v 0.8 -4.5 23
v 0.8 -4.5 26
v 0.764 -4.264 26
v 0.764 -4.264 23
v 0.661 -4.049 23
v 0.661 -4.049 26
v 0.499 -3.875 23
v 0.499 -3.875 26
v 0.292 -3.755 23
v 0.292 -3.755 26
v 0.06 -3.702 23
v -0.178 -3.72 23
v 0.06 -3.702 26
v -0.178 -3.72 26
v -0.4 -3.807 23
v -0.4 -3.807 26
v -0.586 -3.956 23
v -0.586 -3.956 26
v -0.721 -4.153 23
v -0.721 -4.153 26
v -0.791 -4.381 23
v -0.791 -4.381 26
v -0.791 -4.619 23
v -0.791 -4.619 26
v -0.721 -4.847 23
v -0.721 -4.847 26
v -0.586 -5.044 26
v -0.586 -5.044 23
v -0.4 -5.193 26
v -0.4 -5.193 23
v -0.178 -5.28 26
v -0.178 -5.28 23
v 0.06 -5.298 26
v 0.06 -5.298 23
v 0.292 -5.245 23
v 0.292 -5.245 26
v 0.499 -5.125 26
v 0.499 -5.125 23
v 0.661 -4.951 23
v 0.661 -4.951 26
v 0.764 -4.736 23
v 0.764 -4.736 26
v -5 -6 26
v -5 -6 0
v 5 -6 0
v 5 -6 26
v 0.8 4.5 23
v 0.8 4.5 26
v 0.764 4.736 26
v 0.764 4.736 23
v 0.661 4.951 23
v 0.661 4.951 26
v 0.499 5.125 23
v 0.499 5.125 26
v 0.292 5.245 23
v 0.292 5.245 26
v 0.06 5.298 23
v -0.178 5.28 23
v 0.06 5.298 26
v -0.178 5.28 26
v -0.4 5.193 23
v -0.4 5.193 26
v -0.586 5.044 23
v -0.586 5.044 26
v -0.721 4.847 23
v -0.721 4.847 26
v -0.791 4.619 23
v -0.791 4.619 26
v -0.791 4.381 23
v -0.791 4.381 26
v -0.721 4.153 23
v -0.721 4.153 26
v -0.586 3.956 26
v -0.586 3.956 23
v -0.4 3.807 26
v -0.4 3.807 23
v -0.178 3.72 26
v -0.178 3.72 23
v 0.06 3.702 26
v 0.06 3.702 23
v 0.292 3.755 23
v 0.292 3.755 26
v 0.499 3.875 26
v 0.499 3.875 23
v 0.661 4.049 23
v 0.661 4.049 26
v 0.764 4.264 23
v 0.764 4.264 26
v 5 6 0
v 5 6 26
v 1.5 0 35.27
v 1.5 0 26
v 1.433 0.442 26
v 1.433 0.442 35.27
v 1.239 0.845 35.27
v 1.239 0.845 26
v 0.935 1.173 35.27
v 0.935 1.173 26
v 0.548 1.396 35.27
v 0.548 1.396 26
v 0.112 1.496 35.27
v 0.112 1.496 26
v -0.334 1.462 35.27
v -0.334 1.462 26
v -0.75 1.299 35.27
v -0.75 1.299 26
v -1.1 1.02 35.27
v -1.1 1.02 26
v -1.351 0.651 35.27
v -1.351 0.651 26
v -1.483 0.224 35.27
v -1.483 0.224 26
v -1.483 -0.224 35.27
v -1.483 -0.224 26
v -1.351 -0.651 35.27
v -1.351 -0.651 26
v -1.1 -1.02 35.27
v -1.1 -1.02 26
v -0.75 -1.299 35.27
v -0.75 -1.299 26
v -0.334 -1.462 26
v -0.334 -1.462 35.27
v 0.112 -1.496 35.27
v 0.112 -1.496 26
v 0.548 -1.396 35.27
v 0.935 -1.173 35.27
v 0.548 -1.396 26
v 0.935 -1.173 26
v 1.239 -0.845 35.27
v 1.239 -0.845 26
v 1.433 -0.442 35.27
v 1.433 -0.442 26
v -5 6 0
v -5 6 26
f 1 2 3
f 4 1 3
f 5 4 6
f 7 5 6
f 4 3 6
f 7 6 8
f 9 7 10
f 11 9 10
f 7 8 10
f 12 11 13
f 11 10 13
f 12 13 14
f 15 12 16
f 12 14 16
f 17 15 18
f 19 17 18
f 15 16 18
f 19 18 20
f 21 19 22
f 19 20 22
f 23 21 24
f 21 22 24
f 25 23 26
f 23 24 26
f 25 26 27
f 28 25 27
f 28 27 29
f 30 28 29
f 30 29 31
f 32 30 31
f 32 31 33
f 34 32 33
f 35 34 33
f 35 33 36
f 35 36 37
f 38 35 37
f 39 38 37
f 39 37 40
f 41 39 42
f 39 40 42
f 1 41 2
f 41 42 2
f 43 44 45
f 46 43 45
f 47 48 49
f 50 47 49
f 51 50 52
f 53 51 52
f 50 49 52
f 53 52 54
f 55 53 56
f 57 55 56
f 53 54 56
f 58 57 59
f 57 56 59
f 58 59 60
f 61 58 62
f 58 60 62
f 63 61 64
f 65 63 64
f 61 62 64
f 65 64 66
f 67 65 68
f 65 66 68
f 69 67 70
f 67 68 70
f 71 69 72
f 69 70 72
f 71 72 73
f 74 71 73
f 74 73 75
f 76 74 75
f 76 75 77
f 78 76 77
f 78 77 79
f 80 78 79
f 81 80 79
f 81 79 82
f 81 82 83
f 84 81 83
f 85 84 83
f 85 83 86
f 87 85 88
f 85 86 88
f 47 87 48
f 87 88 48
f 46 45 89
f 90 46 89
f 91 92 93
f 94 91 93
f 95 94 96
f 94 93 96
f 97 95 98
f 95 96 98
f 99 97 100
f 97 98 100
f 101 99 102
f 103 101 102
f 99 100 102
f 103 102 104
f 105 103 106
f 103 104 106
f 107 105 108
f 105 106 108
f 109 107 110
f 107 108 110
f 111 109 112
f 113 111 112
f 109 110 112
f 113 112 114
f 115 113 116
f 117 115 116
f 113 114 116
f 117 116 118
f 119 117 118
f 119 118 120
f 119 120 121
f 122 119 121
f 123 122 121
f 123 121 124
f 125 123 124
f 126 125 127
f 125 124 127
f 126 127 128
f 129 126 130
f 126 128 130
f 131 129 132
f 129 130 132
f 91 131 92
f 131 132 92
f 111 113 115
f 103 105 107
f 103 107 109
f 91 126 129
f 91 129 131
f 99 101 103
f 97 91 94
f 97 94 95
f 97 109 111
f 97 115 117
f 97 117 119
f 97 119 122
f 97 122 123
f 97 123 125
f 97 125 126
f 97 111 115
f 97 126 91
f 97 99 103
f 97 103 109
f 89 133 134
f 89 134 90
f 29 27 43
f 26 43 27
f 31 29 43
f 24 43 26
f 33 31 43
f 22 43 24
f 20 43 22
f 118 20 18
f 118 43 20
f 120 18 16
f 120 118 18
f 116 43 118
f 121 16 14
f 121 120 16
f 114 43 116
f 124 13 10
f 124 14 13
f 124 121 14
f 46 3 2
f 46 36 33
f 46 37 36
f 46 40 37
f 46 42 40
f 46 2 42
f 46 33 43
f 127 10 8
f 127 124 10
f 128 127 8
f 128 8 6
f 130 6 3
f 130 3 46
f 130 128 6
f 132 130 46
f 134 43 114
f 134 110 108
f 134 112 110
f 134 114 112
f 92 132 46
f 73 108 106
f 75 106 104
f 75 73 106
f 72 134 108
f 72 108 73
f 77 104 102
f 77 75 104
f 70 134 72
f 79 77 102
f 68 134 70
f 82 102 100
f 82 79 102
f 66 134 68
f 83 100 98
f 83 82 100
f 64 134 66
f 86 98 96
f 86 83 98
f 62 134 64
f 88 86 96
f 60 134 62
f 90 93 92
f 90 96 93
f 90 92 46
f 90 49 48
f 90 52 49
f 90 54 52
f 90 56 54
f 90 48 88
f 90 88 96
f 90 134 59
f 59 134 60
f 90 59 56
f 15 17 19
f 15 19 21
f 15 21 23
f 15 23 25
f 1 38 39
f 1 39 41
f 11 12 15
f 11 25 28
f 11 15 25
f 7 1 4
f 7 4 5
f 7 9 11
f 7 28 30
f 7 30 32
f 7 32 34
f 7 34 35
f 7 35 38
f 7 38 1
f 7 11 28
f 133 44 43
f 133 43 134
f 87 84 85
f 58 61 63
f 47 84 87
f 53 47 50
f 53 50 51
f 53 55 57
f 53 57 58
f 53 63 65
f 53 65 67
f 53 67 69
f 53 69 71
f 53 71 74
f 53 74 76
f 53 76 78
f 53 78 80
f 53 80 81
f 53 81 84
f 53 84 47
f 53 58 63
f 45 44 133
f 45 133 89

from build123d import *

# Parameters (mm, degrees)
F0_W     = 10
F0_H     = 12
F1_DEPTH = 26
F2_R     = 1.5
F3_DEPTH = 9.27
F4_R     = 0.8
F5_DEPTH = 3


with BuildPart() as f1:
    # F0 (on Top) → F1 (new body)
    with BuildSketch(Plane.XY):
        Rectangle(F0_W, F0_H)
    extrude(amount=F1_DEPTH)

    # F2 (on face) → F3 (join)
    with BuildSketch(Plane.XY.offset(26)):
        Circle(F2_R)
    extrude(amount=F3_DEPTH)

    # F4 (on face) → F5 (cut)
    with BuildSketch(Plane.XY.offset(26)):
        with Locations((0, 4.5)):
            Circle(F4_R)
        with Locations((0, -4.5)):
            Circle(F4_R)
    extrude(amount=-F5_DEPTH, mode=Mode.SUBTRACT)


solid = f1.part
